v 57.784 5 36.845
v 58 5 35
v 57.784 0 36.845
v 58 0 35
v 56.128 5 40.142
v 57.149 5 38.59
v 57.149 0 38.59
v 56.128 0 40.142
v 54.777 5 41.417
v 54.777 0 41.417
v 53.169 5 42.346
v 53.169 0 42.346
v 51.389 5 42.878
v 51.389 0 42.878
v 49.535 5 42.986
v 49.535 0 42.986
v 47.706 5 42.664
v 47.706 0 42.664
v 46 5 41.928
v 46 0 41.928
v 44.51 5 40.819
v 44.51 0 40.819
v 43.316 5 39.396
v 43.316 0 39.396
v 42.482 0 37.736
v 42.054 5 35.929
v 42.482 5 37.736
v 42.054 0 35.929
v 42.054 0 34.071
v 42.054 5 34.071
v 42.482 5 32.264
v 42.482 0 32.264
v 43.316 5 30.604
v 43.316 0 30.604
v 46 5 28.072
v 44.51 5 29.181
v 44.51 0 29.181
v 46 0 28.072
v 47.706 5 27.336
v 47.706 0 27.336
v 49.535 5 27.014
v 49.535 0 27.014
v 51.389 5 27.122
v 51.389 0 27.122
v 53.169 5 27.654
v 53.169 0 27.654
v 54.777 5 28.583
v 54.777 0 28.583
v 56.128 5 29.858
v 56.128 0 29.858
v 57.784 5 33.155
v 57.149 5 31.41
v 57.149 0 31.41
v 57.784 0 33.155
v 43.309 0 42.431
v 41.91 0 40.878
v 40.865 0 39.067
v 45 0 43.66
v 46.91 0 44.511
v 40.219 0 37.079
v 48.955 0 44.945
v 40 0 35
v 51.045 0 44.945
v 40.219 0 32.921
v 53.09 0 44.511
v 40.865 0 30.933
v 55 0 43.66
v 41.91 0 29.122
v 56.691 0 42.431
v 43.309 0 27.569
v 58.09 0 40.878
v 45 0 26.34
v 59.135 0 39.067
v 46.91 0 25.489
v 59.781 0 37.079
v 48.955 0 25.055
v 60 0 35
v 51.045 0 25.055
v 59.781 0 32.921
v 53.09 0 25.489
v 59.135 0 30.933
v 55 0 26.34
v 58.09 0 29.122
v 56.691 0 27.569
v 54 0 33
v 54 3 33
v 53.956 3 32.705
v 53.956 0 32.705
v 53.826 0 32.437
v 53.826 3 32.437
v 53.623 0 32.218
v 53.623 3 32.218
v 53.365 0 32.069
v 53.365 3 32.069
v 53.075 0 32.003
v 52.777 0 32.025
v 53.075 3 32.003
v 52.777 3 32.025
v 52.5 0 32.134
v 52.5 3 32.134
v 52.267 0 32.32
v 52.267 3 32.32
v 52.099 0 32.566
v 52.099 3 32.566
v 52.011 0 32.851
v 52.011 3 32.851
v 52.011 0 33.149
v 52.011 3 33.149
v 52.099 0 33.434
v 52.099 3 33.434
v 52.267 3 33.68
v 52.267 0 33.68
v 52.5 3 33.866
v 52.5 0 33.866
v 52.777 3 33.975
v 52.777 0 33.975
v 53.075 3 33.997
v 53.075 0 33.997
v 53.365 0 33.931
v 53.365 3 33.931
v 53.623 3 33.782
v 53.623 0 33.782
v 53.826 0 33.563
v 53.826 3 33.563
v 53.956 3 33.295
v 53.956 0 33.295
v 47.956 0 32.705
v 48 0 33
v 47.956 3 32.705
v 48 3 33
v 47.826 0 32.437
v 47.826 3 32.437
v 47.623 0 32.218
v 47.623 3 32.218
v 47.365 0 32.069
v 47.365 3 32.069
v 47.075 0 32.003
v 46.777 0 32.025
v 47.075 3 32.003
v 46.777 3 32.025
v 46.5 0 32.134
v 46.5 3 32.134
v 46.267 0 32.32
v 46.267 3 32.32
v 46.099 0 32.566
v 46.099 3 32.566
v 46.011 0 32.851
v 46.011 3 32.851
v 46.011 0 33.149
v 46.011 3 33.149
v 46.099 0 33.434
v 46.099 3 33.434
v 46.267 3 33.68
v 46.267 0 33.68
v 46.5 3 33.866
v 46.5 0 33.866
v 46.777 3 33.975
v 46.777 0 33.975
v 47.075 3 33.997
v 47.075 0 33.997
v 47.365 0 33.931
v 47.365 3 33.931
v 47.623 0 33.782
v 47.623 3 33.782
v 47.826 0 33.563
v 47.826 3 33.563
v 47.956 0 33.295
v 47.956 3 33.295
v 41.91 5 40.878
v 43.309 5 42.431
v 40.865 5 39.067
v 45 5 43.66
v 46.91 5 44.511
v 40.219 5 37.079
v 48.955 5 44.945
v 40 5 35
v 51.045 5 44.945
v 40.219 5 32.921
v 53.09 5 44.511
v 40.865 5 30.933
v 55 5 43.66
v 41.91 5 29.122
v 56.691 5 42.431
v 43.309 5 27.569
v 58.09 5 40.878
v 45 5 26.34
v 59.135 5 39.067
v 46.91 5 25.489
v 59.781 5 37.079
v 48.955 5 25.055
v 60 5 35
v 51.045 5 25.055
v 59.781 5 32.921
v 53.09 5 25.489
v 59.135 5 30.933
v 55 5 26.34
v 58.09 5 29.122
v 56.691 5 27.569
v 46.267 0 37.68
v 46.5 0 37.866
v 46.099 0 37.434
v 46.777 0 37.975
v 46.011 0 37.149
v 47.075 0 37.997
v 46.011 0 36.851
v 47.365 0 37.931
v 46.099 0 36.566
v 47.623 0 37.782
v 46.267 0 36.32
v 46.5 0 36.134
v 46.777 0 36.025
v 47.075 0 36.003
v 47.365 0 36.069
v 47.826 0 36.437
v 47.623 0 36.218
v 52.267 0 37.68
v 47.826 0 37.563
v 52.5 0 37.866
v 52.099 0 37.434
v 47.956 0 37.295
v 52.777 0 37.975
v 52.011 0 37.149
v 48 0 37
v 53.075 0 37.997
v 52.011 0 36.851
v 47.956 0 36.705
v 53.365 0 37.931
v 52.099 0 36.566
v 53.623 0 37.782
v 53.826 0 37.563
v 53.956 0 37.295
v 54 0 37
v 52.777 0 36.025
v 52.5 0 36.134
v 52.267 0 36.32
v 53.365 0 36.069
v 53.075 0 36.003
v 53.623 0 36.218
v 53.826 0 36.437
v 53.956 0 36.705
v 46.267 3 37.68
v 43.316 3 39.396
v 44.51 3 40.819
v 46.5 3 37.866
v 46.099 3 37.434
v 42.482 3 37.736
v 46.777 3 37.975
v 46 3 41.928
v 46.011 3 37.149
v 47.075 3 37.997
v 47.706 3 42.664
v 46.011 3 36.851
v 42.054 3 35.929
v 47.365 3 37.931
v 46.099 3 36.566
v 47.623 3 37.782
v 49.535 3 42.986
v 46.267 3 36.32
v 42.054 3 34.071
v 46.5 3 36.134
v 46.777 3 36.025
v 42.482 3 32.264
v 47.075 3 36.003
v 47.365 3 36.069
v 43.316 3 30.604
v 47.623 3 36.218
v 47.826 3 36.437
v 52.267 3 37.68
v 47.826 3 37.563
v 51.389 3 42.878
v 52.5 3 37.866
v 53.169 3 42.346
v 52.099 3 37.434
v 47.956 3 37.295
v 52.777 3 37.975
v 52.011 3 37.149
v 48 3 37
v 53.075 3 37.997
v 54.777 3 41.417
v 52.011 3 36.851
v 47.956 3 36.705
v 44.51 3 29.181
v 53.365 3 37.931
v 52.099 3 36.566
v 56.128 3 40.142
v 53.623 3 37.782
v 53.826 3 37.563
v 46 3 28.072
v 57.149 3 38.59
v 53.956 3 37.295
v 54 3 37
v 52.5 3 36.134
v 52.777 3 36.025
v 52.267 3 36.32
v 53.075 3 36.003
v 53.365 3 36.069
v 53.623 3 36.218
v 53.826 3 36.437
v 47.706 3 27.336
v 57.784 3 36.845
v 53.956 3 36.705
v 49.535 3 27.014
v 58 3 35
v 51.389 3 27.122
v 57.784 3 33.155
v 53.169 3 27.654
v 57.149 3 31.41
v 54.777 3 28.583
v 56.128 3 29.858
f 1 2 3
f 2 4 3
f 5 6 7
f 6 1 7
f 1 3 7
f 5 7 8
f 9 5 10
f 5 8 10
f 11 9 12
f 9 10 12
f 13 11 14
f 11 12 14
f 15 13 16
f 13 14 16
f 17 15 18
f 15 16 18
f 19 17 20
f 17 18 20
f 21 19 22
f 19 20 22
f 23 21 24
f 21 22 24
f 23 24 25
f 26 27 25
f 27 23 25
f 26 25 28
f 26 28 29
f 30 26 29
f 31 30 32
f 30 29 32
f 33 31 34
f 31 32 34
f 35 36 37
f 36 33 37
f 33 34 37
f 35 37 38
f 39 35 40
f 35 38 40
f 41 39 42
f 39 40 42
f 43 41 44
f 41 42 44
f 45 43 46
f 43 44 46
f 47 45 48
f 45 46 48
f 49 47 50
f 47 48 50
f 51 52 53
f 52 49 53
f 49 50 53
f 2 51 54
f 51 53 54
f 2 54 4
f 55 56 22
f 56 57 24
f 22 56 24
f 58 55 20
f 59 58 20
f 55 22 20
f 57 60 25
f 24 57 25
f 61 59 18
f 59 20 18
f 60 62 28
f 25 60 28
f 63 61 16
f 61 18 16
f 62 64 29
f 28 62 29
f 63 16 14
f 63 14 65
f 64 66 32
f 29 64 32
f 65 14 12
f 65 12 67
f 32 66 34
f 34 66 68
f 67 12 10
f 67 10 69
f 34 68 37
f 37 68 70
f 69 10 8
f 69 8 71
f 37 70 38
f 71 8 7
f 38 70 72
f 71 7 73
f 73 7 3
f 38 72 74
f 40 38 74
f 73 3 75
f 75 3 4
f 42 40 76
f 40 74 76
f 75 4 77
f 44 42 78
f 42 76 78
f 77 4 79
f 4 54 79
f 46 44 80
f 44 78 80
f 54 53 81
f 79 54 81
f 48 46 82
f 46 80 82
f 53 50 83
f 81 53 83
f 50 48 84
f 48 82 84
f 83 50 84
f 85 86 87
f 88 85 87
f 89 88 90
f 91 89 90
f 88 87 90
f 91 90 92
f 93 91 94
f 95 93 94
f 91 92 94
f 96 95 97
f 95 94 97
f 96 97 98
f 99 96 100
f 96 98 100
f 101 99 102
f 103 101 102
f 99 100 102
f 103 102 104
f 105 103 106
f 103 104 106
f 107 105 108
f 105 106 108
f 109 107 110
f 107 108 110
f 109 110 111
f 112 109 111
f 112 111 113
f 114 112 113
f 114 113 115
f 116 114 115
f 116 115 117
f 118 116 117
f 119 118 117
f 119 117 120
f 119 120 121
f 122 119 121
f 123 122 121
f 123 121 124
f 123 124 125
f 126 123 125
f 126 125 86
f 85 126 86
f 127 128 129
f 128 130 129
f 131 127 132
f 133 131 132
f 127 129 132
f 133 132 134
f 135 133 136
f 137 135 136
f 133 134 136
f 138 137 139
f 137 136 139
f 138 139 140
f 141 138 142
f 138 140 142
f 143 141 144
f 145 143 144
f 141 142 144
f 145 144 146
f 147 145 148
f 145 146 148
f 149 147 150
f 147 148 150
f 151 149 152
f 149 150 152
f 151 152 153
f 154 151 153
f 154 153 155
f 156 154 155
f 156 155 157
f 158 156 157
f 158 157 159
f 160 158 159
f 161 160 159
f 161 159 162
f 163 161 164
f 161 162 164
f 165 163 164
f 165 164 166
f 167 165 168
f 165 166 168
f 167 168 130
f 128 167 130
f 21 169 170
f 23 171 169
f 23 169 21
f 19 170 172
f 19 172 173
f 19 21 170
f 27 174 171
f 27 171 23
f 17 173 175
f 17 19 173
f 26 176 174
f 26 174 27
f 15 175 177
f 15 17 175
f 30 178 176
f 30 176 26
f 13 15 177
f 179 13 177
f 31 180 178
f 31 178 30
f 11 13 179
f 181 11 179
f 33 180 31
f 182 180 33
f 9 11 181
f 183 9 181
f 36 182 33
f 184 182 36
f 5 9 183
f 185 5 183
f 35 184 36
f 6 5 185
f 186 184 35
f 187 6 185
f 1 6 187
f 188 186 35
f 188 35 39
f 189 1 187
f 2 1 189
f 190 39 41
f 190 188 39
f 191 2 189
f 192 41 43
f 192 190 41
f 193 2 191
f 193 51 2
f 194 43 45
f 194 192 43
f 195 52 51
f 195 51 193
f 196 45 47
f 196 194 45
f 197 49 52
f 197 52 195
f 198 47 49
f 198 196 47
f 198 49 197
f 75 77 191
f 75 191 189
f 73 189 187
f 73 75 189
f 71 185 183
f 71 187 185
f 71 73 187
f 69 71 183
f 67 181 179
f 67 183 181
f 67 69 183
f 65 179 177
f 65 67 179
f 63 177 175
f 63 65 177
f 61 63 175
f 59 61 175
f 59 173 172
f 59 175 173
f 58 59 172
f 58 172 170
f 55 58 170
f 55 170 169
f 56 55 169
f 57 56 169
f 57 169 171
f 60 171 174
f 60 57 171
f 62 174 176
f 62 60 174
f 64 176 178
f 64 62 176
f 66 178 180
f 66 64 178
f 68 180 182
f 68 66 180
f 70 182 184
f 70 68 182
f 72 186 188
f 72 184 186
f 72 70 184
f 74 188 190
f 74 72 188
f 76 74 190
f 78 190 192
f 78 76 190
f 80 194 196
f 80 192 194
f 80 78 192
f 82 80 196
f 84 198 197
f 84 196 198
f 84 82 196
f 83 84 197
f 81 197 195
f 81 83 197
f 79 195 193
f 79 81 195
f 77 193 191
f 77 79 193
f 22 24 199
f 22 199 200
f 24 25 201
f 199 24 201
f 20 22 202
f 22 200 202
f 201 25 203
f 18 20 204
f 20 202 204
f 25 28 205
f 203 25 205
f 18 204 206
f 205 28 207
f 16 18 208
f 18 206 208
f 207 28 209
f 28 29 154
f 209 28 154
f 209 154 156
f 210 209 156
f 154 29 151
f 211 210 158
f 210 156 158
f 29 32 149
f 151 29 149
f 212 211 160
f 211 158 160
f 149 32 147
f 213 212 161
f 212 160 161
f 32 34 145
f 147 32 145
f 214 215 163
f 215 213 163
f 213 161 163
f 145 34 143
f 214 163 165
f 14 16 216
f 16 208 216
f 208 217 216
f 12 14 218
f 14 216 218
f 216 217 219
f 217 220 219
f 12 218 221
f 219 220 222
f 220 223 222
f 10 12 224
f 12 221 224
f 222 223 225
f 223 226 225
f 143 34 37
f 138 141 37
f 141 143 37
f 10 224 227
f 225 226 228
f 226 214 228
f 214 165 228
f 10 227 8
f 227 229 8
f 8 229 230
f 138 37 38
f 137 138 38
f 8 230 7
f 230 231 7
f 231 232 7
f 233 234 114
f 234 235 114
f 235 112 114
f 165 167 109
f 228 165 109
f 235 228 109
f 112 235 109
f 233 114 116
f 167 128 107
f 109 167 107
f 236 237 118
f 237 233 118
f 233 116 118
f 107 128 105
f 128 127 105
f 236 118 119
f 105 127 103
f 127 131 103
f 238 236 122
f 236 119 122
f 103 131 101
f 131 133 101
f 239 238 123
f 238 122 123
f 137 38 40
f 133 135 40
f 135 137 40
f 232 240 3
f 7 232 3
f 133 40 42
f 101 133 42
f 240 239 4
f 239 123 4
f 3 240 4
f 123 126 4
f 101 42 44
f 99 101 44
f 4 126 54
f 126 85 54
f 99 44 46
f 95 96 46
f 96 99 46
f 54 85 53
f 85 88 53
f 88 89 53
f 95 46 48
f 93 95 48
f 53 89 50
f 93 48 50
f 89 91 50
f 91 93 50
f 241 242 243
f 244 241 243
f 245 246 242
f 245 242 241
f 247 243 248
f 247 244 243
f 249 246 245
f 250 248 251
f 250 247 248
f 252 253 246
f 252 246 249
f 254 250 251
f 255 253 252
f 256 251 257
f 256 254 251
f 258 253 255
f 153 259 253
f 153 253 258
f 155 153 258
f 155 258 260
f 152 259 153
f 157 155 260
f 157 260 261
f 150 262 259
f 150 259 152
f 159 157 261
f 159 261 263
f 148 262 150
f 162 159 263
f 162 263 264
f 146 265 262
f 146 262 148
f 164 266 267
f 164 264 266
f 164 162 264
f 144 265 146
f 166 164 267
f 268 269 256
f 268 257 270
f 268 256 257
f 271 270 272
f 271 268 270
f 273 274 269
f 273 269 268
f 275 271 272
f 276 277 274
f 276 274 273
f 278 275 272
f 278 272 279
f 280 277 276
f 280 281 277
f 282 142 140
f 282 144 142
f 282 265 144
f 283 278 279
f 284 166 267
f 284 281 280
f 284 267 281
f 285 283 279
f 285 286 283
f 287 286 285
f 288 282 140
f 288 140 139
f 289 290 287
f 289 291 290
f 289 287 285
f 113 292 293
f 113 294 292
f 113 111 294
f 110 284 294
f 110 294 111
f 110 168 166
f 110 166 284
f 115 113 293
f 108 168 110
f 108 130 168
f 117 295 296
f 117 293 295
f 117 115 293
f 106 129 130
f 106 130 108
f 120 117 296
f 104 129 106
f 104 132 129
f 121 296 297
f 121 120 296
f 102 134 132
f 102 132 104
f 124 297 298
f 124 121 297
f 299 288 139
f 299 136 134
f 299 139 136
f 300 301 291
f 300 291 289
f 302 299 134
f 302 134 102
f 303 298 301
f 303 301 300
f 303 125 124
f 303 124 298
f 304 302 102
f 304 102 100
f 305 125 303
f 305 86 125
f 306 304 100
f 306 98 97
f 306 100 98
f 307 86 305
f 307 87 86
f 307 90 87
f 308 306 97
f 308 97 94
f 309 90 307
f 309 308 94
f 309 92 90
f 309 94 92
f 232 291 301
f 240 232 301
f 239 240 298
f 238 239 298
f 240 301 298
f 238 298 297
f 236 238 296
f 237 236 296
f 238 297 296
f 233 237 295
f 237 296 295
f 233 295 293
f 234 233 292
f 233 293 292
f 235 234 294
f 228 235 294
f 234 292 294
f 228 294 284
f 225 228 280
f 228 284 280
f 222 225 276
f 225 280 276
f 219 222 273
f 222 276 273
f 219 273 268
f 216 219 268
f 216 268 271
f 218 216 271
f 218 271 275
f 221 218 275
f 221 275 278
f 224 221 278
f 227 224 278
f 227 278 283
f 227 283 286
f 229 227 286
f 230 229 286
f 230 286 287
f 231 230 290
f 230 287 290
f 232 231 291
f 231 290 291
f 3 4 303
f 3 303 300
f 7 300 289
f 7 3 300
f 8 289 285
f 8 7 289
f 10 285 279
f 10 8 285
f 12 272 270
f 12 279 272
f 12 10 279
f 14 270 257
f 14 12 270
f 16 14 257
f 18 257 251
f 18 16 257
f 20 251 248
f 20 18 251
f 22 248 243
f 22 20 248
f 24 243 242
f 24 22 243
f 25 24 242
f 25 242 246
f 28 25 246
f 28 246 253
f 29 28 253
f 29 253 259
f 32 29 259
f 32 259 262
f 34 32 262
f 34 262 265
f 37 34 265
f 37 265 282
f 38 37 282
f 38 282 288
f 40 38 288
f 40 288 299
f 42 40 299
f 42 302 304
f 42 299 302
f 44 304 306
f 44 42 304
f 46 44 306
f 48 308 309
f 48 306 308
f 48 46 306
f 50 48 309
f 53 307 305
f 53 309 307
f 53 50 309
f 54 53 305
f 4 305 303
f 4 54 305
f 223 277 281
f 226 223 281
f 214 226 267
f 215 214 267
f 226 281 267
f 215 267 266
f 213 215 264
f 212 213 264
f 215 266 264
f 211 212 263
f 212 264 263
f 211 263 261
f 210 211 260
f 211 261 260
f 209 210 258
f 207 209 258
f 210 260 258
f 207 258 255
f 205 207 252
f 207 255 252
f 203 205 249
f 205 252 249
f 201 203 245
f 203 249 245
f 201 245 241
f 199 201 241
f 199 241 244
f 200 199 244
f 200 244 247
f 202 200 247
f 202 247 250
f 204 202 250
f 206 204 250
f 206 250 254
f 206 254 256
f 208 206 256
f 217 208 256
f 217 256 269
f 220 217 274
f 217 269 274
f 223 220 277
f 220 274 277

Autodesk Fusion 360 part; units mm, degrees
sketch "草图1" plane through (0, 0, 0) normal (0, 1, 0) x (1, 0, 0)
  circle A0 centre (50, -35) radius 10
  circle A1 centre (50, -35) radius 8
  dimension "d1" = 2
extrude "拉伸1" add sketch "草图1" along normal blind 3 contours A1 makes body 1
extrude "拉伸2" add sketch "草图1" along normal blind 5 separate body makes body 2
cylinder "圆柱体基本要素1" add diameter 2 height 20 placed x (1, 0, 0) y (0, 0, -1) z (0, 1, 0) at (50, 0, 10) separate body makes body 3
move_body "移动1" bodies 3 to x (1, 0, 0) y (0, 1, 0) z (0, 0, 1) at (-2, 0, 21)
pattern_linear "R-阵列1" count 2 spacing 6 along (1, 0, 0) count 2 spacing 4 along (0, 0, 1) of bodies 3 makes body 4 at (54.995, 13.3333, 31.0996) makes body 5 at (47.1218, 6.6667, 34.5217) makes body 6 at (53.1218, 6.6667, 34.5217)
move_body "移动2" bodies 3 4 6 5 to x (1, 0, 0) y (0, 1, 0) z (0, 0, 1) at (-1, 0, 2)
combine "合并1" operation cut target body 1 tool bodies 4 5 6 3
